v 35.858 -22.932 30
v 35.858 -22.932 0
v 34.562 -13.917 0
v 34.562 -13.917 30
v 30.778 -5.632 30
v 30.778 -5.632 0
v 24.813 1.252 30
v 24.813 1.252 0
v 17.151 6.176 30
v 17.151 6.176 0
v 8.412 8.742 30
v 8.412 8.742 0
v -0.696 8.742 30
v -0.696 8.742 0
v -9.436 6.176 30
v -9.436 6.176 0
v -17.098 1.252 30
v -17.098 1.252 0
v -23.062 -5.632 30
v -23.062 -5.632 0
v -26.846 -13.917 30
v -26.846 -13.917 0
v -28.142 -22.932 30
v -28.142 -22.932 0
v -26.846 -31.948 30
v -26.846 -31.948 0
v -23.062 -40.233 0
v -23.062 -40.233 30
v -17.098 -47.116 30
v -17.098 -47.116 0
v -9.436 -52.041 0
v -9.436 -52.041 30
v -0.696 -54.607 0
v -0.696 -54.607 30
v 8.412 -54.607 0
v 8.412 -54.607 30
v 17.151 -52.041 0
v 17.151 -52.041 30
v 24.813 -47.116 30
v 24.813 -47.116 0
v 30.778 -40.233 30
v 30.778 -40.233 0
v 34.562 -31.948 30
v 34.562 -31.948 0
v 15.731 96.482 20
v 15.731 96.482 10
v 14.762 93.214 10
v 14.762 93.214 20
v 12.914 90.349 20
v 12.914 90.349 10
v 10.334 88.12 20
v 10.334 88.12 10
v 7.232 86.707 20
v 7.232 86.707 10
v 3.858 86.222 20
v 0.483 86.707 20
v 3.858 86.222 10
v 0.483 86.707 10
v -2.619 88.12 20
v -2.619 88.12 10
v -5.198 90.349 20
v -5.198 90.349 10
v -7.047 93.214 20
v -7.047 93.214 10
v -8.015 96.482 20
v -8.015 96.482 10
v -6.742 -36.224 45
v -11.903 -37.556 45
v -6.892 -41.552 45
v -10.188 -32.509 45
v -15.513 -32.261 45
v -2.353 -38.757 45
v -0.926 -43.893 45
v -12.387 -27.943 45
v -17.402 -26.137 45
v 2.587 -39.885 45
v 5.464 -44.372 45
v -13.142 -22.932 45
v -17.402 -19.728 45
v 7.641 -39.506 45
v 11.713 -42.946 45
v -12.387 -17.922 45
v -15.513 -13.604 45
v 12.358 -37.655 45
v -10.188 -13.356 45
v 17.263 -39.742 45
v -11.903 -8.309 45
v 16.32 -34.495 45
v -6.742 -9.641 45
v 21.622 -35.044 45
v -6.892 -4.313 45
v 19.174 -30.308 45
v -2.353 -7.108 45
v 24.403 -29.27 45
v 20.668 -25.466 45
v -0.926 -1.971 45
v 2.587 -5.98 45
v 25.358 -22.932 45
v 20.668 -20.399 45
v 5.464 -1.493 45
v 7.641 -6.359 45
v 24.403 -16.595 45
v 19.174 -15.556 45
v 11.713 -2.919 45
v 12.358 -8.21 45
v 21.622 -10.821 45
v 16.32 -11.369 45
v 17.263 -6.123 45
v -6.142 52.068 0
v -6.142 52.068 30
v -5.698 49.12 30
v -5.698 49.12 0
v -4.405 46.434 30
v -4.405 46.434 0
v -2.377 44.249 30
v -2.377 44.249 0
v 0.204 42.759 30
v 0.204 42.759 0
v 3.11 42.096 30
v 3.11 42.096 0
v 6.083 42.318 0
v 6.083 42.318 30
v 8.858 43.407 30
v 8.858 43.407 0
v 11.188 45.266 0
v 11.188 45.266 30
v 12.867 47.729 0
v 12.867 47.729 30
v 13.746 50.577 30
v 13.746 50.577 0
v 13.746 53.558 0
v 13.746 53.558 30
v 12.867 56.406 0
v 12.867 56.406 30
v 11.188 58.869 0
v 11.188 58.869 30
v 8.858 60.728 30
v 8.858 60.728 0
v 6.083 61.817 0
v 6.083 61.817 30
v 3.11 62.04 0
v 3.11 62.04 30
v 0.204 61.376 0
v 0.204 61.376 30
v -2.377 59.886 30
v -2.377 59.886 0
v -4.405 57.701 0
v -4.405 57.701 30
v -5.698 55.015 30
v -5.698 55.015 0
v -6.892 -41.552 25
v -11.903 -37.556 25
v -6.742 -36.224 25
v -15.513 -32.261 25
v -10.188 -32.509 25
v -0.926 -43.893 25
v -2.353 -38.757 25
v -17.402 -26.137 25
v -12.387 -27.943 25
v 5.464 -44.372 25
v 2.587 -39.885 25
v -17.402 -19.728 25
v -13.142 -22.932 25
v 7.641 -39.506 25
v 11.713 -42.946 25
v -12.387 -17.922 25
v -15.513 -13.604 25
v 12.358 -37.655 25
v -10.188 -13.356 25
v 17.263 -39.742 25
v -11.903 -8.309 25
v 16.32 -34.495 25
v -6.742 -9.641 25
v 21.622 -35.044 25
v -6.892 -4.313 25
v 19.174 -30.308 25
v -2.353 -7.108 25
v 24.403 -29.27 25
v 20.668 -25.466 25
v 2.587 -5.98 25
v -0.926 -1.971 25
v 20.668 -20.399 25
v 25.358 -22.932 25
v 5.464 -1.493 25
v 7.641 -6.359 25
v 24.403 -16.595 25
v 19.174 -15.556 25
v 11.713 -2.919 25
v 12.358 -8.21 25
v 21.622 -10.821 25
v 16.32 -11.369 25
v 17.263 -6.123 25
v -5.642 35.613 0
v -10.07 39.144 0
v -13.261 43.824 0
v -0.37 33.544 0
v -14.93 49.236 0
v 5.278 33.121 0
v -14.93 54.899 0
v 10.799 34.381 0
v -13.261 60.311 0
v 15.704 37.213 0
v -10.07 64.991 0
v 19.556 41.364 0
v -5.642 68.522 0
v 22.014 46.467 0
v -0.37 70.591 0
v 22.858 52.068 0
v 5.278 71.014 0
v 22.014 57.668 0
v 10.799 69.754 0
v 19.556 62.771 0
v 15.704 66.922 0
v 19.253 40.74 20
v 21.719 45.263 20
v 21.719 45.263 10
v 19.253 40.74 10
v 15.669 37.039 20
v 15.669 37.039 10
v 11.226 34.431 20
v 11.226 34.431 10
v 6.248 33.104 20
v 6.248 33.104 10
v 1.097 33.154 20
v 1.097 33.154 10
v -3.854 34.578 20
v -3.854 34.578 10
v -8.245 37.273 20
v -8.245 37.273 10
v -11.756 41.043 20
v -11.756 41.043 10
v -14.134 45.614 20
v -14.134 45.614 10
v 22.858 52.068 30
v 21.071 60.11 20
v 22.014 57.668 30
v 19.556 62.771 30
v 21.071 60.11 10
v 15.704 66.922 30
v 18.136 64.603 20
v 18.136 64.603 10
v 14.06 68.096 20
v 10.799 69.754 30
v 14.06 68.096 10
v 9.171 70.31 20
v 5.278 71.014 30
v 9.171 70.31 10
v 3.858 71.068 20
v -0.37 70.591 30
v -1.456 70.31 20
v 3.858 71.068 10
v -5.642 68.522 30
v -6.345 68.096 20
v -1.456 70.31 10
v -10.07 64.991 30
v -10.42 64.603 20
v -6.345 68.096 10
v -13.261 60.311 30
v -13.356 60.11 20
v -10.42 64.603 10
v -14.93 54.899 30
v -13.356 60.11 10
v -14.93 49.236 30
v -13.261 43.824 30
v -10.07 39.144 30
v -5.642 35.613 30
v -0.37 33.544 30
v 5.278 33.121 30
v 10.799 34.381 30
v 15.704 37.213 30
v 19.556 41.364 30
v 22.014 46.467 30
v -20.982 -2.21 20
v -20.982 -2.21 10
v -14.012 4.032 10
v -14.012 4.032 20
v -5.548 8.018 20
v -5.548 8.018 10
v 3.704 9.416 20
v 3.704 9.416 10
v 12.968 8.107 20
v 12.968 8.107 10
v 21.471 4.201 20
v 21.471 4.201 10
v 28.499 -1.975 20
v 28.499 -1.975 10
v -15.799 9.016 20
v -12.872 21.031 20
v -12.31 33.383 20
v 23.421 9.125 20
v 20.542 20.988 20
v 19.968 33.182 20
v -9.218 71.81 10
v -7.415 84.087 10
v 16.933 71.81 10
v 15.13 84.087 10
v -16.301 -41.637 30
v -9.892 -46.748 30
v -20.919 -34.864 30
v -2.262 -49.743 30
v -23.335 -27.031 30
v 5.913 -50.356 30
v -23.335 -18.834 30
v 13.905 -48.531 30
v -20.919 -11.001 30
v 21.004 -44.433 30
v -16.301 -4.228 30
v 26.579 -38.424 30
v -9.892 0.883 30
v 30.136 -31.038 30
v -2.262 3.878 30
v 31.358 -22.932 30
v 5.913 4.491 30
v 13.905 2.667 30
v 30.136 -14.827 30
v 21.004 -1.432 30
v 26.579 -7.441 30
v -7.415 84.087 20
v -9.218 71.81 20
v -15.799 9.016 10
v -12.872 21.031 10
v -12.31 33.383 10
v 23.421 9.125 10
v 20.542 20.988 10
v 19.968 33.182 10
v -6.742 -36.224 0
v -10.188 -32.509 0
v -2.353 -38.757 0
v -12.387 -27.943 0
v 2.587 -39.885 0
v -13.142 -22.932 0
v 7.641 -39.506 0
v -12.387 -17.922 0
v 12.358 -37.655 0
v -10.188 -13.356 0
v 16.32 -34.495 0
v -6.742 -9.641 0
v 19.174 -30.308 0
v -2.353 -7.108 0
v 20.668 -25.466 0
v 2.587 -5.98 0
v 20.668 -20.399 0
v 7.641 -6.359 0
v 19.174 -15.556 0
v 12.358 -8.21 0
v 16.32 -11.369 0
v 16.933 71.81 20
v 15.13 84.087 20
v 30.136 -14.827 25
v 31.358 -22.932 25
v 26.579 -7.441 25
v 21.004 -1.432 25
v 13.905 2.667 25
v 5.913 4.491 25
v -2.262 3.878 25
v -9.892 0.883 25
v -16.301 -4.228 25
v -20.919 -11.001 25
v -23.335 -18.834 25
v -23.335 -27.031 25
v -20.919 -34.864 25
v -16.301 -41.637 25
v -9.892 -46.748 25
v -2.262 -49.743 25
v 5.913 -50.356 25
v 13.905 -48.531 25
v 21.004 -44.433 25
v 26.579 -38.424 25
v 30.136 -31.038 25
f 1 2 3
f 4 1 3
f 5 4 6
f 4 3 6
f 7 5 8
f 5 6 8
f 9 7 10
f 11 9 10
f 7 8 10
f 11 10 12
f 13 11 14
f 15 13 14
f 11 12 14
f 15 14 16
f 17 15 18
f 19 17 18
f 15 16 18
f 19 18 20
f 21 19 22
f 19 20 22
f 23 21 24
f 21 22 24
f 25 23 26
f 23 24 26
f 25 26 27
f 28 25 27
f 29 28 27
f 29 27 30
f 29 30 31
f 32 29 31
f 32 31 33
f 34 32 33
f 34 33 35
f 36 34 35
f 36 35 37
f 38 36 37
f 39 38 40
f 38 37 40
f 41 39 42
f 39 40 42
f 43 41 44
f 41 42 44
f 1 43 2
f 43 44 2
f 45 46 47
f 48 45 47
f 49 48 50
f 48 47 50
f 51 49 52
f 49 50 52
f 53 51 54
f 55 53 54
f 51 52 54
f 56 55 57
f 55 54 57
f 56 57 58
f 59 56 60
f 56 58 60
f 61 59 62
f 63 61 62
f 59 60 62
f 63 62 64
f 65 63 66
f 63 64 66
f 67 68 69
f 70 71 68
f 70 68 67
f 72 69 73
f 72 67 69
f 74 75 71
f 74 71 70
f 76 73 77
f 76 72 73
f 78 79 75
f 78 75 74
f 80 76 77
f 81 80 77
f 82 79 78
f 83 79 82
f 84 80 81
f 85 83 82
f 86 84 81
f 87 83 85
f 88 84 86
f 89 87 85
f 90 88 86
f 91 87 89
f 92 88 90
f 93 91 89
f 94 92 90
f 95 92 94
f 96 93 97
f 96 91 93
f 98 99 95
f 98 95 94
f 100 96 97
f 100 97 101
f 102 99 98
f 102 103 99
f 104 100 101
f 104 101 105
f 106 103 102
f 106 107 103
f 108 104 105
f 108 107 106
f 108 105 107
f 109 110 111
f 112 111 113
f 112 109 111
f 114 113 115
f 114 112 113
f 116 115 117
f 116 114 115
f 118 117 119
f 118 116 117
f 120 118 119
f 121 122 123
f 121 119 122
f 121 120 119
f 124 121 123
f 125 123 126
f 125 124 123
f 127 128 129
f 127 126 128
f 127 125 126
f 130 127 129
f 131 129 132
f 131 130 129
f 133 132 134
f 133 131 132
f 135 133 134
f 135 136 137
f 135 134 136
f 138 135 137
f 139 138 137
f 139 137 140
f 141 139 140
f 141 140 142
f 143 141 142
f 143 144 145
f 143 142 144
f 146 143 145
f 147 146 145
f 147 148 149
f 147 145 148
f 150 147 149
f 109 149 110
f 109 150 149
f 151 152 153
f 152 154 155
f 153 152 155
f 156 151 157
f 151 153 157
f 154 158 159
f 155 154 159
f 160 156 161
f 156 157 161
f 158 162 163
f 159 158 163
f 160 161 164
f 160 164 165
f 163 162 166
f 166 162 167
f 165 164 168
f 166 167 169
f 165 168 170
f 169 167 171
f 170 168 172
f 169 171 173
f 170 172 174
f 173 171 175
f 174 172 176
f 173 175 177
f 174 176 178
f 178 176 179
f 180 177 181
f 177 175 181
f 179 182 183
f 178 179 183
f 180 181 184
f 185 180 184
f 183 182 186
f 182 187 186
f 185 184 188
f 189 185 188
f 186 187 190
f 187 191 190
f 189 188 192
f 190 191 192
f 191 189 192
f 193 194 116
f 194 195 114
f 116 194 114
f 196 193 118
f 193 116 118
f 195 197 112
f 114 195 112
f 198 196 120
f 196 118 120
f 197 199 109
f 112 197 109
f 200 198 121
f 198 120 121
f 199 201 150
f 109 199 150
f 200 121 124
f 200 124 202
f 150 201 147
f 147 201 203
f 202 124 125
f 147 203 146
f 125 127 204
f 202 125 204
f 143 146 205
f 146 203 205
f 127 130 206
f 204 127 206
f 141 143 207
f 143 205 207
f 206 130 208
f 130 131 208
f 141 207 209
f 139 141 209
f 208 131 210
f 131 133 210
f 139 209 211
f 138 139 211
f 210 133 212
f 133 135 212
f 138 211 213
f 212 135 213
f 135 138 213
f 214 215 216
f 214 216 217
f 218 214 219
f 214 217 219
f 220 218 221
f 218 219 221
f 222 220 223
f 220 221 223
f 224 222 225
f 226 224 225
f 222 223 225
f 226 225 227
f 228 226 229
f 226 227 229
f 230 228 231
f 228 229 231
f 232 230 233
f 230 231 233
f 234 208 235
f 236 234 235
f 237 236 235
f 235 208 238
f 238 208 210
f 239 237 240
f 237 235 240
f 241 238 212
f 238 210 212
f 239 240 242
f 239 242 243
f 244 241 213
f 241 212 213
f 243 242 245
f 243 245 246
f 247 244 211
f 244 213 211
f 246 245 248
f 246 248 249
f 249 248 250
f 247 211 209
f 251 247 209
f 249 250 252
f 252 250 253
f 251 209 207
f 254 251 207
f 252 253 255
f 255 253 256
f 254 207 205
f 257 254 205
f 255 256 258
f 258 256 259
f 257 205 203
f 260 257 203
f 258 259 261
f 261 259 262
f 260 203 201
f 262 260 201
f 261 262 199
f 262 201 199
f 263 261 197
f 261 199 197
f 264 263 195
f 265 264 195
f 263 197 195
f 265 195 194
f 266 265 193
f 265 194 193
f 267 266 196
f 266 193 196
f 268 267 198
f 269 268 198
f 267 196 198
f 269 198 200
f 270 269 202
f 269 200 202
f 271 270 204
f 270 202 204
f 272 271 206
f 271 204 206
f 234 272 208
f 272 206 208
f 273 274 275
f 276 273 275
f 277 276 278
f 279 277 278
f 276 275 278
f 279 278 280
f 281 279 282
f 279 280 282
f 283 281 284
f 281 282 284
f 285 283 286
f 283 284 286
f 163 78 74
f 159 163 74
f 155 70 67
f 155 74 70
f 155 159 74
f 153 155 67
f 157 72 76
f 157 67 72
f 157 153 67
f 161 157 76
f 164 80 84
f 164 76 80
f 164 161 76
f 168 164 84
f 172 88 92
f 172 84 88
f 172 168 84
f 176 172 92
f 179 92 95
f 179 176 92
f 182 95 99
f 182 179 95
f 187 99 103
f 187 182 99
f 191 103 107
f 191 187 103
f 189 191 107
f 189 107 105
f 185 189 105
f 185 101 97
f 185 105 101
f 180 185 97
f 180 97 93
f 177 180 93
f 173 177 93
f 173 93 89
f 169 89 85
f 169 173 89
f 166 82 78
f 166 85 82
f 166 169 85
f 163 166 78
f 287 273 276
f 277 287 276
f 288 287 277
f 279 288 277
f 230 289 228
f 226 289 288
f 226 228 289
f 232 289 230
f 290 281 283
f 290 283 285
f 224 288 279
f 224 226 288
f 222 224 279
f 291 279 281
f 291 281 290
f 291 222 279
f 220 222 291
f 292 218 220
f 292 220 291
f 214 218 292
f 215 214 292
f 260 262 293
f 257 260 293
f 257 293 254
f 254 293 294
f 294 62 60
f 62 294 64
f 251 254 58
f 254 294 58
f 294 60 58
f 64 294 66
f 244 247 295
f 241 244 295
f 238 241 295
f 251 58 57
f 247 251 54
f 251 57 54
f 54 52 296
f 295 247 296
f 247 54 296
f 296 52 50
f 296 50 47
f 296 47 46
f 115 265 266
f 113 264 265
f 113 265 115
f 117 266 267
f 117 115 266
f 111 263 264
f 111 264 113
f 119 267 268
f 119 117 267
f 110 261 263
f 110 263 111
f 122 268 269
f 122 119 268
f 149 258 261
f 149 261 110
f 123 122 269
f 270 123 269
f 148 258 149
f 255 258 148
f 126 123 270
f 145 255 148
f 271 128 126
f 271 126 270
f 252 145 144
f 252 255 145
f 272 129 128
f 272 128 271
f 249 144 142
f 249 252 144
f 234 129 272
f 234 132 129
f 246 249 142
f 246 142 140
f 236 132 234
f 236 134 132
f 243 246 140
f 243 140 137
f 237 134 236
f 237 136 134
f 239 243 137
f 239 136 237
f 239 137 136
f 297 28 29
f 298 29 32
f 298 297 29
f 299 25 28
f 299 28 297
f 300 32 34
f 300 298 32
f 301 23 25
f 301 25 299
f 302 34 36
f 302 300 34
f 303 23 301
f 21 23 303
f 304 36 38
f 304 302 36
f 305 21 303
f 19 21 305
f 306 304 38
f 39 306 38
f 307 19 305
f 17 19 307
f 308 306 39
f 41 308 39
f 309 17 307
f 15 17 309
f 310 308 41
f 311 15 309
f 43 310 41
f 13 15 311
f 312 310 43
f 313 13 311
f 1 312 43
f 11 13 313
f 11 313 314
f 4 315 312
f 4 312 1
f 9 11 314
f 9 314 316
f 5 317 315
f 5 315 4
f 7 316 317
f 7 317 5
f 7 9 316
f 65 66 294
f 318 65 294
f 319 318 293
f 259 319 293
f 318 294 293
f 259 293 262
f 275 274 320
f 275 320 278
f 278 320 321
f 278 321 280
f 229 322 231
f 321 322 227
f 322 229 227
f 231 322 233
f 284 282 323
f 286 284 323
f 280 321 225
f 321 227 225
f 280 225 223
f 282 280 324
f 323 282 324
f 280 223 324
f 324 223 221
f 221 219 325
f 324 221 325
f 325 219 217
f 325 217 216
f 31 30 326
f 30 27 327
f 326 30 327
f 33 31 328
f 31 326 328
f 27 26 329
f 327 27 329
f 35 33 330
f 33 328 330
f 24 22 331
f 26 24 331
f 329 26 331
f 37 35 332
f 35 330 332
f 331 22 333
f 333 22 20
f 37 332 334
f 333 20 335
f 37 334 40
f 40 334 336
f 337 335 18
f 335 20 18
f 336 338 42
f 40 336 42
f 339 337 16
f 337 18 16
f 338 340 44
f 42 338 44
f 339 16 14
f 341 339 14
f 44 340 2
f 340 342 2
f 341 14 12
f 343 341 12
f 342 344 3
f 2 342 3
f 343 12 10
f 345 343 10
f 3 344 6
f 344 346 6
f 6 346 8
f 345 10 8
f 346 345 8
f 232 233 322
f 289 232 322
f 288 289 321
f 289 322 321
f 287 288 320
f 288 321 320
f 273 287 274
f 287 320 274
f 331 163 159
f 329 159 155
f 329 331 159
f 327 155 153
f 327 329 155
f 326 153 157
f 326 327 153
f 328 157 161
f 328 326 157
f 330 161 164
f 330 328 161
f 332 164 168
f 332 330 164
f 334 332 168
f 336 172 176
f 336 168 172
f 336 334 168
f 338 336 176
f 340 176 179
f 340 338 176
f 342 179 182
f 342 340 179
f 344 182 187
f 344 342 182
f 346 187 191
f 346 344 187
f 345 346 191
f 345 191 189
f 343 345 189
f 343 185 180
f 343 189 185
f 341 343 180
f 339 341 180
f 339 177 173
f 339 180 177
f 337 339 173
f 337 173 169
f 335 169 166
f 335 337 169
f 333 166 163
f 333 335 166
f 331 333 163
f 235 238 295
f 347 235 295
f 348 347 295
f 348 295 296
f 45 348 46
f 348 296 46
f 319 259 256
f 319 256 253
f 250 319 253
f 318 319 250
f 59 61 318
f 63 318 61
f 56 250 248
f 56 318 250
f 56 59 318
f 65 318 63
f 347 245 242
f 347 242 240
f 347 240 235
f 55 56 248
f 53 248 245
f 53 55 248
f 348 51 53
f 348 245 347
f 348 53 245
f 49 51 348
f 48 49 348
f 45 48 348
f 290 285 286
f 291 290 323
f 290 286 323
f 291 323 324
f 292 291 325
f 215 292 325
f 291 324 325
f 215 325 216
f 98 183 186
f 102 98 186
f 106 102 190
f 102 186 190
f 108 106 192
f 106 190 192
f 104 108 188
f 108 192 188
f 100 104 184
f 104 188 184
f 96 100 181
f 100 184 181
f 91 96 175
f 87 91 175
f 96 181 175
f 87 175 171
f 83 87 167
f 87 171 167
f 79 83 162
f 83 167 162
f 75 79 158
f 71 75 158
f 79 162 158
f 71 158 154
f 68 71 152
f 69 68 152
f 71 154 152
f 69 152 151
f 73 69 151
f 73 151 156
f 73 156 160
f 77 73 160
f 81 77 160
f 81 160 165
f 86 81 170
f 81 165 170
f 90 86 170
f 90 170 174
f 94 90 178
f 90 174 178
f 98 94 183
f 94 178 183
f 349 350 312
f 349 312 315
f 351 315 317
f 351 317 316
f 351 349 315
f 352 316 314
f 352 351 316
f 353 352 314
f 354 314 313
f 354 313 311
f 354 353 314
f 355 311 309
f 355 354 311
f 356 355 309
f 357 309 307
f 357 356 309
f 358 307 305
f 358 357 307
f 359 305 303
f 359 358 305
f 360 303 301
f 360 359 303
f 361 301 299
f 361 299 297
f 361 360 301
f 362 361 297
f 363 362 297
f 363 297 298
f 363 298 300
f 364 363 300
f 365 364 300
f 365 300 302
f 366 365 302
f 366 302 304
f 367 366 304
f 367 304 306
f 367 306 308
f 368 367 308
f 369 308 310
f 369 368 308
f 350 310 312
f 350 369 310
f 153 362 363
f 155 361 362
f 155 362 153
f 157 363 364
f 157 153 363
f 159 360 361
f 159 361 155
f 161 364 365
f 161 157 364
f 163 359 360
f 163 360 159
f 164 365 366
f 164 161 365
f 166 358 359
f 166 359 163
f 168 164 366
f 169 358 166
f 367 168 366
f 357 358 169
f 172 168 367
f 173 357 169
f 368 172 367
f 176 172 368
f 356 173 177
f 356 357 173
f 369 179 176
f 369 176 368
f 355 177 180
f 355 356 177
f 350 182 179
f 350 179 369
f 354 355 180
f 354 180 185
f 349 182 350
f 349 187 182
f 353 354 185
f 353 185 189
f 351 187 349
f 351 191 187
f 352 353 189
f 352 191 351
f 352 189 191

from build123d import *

# Parameters (mm, degrees)
SKETCH2_R             = 19
BOSS_EXTRUDE1_DEPTH   = 30
SKETCH2_R_2           = 32
BOSS_EXTRUDE1_2_DEPTH = 30
BOSS_EXTRUDE2_DEPTH   = 10
SKETCH4_R             = 27.5
CUT_EXTRUDE1_DEPTH    = 5
SKETCH5_R             = 21.5
BOSS_EXTRUDE3_DEPTH   = 20
SKETCH6_R             = 17
SKETCH6_R_2           = 10
CUT_EXTRUDE2_DEPTH    = 113.3371596


with BuildPart() as part:
    # Sketch2 → Boss-Extrude1 (new body)
    with BuildSketch(Plane.XY):
        with Locations((3.857754872, 52.067565658)):
            Circle(SKETCH2_R)
    extrude(amount=BOSS_EXTRUDE1_DEPTH)

    # Sketch3 → Boss-Extrude2 (add)
    with BuildSketch(Plane.XY.offset(10)):
        with BuildLine():
            ThreePointArc((28.499357068, -1.97501589), (20.541861527, 20.988265898), (21.719409946, 45.262685056))
            ThreePointArc((21.719409946, 45.262685056), (3.670693383, 32.954477734), (-14.133665881, 45.613582293))
            ThreePointArc((-14.133665881, 45.613582293), (-12.871979086, 21.030531271), (-20.982159168, -2.210450425))
            ThreePointArc((-20.982159168, -2.210450425), (3.703841741, 9.415645319), (28.499357068, -1.97501589))
        make_face()
        with BuildLine():
            ThreePointArc((-13.355964266, 60.110442845), (3.857754872, 71.067565658), (21.07147401, 60.110442845))
            ThreePointArc((21.07147401, 60.110442845), (15.73347068, 77.904728914), (15.730929568, 96.482427636))
            ThreePointArc((15.730929568, 96.482427636), (3.857754872, 86.222462877), (-8.015419824, 96.482427636))
            ThreePointArc((-8.015419824, 96.482427636), (-8.017960936, 77.904728914), (-13.355964266, 60.110442845))
        make_face()
    extrude(amount=BOSS_EXTRUDE2_DEPTH)


with BuildPart() as body_2:
    # Sketch2 → Boss-Extrude1 2 (new body)
    with BuildSketch(Plane.XY):
        with Locations((3.857754872, -22.932434342)):
            Circle(SKETCH2_R_2)
    extrude(amount=BOSS_EXTRUDE1_2_DEPTH)

    # Sketch4 → Cut-Extrude1 (cut)
    with BuildSketch(Plane.XY.offset(25)):
        with Locations((3.857754872, -22.932434342)):
            Circle(SKETCH4_R)
    extrude(amount=CUT_EXTRUDE1_DEPTH, mode=Mode.SUBTRACT)


with BuildPart() as boss_extrude2_piece_1:
    # of the separate pieces the step leaves, piece 1, a body of its own (boss_extrude2_pieces)
    add(part.part.solids().sort_by_distance((22.857754872, 52.067565658, 0))[0])


with BuildPart() as boss_extrude2_piece_2:
    # of the separate pieces the step leaves, piece 2, a body of its own (boss_extrude2_pieces)
    add(part.part.solids().sort_by_distance((-14.133665881, 45.613582293, 10))[0])


with BuildPart() as body_4:
    # Sketch5 → Boss-Extrude3 (new body)
    with BuildSketch(Plane.XY.offset(25)):
        with Locations((3.857754872, -22.932434342)):
            Circle(SKETCH5_R)
    extrude(amount=BOSS_EXTRUDE3_DEPTH)


with BuildPart() as cut_extrude2_tool:
    # Sketch6 → Cut-Extrude2 (new, through all)
    with BuildSketch(Plane.XY):
        with Locations(Location((3.857754872, -22.932434342, 0), (0, 0, 180))):
            Circle(SKETCH6_R)
        with Locations(Location((3.857754872, 52.067565658, 0), (0, 0, 180))):
            Circle(SKETCH6_R_2)
    extrude(amount=CUT_EXTRUDE2_DEPTH)


with BuildPart() as body_2_1:
    add(body_2.part)

    # Cut-Extrude2: cut by cut_extrude2_tool
    add(cut_extrude2_tool.part, mode=Mode.SUBTRACT)


with BuildPart() as boss_extrude2_piece_1_1:
    add(boss_extrude2_piece_1.part)

    # Cut-Extrude2: cut by cut_extrude2_tool
    add(cut_extrude2_tool.part, mode=Mode.SUBTRACT)


with BuildPart() as body_4_1:
    add(body_4.part)

    # Cut-Extrude2: cut by cut_extrude2_tool
    add(cut_extrude2_tool.part, mode=Mode.SUBTRACT)


solid = Compound([boss_extrude2_piece_2.part, body_2_1.part, boss_extrude2_piece_1_1.part, body_4_1.part])
